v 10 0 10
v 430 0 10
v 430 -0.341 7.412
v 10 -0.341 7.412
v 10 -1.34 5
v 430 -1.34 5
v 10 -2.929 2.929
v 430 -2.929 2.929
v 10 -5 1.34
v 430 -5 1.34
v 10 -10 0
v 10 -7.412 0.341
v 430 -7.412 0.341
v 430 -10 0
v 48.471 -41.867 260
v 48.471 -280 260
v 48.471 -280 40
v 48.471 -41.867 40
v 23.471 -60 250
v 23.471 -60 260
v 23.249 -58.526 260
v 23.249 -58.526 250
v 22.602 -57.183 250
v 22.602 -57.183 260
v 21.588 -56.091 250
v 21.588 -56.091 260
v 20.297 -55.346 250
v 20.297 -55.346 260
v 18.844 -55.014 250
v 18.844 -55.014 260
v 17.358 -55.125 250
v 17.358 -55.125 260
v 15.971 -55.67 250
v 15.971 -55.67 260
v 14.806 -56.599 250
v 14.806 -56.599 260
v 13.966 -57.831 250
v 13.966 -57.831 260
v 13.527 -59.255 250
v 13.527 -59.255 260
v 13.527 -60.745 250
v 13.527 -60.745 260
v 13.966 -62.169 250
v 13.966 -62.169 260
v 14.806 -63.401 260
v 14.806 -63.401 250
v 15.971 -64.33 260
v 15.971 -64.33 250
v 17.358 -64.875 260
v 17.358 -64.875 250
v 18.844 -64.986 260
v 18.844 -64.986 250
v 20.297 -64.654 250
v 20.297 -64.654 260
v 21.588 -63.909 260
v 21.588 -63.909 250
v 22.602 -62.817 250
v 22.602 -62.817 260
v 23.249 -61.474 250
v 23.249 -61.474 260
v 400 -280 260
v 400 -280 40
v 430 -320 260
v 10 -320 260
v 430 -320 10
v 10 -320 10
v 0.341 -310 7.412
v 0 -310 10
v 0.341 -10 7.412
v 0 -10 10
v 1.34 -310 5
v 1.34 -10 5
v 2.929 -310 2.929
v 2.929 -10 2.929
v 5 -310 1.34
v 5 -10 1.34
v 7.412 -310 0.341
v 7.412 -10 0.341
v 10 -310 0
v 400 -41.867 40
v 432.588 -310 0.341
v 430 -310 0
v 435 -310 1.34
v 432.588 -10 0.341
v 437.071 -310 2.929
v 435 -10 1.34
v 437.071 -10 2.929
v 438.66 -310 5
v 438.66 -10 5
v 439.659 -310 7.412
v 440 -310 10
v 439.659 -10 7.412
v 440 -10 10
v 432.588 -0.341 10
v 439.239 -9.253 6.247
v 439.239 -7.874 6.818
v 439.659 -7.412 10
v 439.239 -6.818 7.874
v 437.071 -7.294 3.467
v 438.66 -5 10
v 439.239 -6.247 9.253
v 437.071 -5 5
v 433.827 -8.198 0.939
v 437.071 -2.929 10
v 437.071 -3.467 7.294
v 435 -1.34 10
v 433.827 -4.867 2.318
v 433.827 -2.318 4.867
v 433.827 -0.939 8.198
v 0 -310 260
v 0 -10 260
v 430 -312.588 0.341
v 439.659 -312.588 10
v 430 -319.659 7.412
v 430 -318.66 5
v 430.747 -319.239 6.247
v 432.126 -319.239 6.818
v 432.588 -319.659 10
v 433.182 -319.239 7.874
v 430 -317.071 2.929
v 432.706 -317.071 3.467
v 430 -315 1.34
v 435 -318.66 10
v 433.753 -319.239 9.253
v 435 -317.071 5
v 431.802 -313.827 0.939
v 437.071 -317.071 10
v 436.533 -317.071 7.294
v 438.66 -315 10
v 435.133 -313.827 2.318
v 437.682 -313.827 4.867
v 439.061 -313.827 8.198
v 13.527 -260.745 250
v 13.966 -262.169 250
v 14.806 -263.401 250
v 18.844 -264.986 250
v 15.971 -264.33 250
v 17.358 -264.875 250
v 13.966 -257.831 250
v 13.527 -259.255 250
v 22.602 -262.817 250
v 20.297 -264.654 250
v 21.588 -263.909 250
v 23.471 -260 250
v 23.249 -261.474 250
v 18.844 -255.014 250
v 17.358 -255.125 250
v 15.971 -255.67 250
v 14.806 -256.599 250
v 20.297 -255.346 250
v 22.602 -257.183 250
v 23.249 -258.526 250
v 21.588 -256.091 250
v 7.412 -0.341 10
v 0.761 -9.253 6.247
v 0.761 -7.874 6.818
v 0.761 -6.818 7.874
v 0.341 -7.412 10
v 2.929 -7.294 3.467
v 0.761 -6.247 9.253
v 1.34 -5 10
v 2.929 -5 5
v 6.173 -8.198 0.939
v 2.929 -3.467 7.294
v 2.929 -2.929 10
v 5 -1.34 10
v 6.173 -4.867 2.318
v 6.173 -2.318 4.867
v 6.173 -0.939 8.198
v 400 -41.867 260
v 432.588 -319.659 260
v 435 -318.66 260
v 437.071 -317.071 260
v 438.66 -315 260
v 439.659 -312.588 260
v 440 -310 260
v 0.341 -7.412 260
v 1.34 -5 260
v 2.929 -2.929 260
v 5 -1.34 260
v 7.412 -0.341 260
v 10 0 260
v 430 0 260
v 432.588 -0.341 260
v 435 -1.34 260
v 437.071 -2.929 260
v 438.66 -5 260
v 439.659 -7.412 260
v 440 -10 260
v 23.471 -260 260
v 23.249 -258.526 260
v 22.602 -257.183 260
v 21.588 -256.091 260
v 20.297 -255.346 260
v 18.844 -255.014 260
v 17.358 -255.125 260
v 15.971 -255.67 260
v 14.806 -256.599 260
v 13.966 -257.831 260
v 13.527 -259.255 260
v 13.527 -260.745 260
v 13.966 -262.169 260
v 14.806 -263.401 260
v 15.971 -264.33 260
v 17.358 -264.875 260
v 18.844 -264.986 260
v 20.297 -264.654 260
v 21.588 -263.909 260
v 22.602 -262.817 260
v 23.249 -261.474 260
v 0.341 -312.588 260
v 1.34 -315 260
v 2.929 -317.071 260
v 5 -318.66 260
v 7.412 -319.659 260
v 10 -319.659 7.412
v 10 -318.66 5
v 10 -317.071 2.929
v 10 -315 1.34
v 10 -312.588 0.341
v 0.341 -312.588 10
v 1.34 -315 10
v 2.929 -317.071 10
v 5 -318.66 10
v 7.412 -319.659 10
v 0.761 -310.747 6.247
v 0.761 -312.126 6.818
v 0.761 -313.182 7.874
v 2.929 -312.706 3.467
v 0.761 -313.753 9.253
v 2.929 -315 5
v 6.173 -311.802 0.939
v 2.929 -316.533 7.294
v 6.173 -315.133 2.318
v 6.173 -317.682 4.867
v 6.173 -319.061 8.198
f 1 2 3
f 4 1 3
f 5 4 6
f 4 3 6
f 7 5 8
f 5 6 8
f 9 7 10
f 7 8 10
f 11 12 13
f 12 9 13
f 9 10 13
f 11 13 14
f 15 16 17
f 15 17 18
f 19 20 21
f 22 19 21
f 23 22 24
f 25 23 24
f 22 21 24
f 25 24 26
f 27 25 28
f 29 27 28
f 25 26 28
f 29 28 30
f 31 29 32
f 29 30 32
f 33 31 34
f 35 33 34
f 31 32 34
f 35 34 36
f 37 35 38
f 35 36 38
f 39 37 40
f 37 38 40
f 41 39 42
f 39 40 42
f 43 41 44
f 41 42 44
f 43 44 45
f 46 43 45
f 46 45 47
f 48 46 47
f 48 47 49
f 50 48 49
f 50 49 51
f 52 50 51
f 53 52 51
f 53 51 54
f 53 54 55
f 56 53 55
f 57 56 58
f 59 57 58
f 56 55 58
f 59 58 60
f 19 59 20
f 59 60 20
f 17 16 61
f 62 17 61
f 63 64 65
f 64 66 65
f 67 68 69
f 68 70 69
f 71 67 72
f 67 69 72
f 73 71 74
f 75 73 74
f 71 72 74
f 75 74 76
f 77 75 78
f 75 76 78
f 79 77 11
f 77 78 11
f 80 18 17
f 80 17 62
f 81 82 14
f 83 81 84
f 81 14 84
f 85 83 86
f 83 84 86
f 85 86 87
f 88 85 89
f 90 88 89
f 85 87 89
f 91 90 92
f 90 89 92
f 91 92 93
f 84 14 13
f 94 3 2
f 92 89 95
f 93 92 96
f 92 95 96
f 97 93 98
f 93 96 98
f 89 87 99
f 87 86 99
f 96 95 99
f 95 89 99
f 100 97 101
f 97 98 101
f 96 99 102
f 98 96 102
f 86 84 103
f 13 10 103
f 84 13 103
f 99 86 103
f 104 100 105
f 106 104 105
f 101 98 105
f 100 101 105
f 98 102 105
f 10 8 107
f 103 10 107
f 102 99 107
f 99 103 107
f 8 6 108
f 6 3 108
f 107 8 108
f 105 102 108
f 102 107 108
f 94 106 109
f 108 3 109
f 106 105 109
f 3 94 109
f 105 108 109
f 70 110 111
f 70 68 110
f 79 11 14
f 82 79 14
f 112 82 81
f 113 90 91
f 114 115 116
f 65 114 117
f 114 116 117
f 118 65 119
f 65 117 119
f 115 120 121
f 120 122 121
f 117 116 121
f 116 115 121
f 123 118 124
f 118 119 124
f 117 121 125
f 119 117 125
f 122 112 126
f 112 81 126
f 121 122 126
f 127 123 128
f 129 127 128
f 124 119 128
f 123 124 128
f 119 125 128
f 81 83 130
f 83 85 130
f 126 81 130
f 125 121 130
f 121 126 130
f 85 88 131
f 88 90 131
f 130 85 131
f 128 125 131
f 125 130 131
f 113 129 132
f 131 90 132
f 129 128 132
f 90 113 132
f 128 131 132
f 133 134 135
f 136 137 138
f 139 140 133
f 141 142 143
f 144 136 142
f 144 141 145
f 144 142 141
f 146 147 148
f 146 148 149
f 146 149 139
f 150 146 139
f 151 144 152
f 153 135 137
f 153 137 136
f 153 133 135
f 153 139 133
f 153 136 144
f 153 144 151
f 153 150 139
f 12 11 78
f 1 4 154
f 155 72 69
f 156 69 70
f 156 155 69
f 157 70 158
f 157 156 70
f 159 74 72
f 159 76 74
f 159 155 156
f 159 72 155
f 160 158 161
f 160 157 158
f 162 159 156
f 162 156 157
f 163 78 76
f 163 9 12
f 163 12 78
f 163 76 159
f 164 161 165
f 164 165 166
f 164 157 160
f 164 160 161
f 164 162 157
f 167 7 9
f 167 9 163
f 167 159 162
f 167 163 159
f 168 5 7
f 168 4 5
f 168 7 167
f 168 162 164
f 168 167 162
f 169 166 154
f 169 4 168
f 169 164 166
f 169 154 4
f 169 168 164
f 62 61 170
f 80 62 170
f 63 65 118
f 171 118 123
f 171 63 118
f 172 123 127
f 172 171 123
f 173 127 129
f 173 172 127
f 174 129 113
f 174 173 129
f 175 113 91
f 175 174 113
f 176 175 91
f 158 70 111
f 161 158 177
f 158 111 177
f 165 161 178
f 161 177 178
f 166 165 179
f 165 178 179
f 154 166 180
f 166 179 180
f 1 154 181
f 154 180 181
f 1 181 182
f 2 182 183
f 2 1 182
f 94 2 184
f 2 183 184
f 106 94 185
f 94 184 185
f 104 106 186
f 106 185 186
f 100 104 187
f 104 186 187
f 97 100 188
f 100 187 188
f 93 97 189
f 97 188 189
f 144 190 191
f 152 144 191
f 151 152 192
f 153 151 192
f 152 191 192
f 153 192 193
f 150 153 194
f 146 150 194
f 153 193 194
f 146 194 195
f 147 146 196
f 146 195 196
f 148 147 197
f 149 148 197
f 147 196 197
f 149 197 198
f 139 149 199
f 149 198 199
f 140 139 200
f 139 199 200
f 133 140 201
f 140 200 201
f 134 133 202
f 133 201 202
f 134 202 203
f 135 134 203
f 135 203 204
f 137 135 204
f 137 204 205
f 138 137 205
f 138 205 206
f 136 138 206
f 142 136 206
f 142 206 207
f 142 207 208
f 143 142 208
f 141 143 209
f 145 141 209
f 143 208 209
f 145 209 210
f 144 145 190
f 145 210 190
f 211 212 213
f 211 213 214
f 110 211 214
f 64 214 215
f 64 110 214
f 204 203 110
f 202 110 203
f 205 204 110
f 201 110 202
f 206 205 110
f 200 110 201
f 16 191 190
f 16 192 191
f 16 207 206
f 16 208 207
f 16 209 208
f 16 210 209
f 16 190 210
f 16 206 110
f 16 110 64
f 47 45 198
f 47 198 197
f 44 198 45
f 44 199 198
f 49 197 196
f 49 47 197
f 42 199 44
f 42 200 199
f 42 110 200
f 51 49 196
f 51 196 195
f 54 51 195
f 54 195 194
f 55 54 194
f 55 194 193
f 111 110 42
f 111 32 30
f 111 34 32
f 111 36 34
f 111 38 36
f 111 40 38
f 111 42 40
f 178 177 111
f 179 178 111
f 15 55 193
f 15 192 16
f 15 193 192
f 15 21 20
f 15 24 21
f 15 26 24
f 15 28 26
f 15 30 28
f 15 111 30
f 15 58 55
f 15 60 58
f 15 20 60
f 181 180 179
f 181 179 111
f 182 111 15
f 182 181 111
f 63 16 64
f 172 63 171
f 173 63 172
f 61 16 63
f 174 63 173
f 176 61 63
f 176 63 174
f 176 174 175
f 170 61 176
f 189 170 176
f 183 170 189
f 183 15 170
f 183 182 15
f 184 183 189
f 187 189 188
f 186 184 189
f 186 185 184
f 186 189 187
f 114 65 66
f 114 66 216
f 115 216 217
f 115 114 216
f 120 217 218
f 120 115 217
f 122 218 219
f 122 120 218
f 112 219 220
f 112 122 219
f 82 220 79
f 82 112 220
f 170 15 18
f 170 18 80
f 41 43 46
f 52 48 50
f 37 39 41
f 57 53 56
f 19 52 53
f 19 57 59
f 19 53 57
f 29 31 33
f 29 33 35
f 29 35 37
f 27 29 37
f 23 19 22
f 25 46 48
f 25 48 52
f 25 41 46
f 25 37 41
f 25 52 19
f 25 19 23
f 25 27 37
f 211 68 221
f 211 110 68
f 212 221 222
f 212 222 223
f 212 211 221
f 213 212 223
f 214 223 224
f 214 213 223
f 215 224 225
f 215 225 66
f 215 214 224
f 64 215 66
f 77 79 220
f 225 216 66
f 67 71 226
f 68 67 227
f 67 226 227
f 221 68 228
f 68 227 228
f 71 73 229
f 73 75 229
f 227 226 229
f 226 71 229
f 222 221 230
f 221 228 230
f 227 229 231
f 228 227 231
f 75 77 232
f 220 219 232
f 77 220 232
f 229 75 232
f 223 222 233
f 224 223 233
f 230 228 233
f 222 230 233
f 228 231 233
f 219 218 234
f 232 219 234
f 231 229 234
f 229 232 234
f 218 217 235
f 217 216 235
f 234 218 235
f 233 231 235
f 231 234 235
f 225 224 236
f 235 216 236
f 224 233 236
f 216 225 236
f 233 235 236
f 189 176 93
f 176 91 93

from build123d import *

# Parameters (mm, degrees)
SKETCH_1_W          = 440
SKETCH_1_H          = 320
EXTRUDE_1_DEPTH     = 260
SKETCH_6_W          = 351.529236831
SKETCH_6_H          = 238.132708821
CUT_EXTRUDE_1_DEPTH = 220
FILLET_1_R          = 10
SKETCH_7_R          = 5
CUT_EXTRUDE_2_DEPTH = 10


with BuildPart() as part:
    # 草图1 → 凸台-拉伸1 (new body)
    with BuildSketch(Plane.XY):
        with Locations((220, -160)):
            Rectangle(SKETCH_1_W, SKETCH_1_H)
    extrude(amount=EXTRUDE_1_DEPTH)

    # 草图6 → 切除-拉伸1 (cut)
    with BuildSketch(Plane.XY.offset(260)):
        with Locations((224.235381585, -160.93364559)):
            Rectangle(SKETCH_6_W, SKETCH_6_H)
    extrude(amount=-CUT_EXTRUDE_1_DEPTH, mode=Mode.SUBTRACT)

    # 圆角1
    fillet_1_edges = [part.edges().sort_by_distance(p)[0] for p in [
        (220, 0, 0),
        (440, -160, 0),
        (220, -320, 0),
        (0, -160, 0),
        (0, 0, 130),
        (440, 0, 130),
        (440, -320, 130),
        (0, -320, 130),
    ]]
    fillet(fillet_1_edges, radius=FILLET_1_R)

    # 草图7 → 切除-拉伸2 (cut)
    with BuildSketch(Plane.XY.offset(260)):
        with Locations((18.470763169, -60)):
            Circle(SKETCH_7_R)
        with Locations((18.470763169, -260)):
            Circle(SKETCH_7_R)
    extrude(amount=-CUT_EXTRUDE_2_DEPTH, mode=Mode.SUBTRACT)


solid = part.part
